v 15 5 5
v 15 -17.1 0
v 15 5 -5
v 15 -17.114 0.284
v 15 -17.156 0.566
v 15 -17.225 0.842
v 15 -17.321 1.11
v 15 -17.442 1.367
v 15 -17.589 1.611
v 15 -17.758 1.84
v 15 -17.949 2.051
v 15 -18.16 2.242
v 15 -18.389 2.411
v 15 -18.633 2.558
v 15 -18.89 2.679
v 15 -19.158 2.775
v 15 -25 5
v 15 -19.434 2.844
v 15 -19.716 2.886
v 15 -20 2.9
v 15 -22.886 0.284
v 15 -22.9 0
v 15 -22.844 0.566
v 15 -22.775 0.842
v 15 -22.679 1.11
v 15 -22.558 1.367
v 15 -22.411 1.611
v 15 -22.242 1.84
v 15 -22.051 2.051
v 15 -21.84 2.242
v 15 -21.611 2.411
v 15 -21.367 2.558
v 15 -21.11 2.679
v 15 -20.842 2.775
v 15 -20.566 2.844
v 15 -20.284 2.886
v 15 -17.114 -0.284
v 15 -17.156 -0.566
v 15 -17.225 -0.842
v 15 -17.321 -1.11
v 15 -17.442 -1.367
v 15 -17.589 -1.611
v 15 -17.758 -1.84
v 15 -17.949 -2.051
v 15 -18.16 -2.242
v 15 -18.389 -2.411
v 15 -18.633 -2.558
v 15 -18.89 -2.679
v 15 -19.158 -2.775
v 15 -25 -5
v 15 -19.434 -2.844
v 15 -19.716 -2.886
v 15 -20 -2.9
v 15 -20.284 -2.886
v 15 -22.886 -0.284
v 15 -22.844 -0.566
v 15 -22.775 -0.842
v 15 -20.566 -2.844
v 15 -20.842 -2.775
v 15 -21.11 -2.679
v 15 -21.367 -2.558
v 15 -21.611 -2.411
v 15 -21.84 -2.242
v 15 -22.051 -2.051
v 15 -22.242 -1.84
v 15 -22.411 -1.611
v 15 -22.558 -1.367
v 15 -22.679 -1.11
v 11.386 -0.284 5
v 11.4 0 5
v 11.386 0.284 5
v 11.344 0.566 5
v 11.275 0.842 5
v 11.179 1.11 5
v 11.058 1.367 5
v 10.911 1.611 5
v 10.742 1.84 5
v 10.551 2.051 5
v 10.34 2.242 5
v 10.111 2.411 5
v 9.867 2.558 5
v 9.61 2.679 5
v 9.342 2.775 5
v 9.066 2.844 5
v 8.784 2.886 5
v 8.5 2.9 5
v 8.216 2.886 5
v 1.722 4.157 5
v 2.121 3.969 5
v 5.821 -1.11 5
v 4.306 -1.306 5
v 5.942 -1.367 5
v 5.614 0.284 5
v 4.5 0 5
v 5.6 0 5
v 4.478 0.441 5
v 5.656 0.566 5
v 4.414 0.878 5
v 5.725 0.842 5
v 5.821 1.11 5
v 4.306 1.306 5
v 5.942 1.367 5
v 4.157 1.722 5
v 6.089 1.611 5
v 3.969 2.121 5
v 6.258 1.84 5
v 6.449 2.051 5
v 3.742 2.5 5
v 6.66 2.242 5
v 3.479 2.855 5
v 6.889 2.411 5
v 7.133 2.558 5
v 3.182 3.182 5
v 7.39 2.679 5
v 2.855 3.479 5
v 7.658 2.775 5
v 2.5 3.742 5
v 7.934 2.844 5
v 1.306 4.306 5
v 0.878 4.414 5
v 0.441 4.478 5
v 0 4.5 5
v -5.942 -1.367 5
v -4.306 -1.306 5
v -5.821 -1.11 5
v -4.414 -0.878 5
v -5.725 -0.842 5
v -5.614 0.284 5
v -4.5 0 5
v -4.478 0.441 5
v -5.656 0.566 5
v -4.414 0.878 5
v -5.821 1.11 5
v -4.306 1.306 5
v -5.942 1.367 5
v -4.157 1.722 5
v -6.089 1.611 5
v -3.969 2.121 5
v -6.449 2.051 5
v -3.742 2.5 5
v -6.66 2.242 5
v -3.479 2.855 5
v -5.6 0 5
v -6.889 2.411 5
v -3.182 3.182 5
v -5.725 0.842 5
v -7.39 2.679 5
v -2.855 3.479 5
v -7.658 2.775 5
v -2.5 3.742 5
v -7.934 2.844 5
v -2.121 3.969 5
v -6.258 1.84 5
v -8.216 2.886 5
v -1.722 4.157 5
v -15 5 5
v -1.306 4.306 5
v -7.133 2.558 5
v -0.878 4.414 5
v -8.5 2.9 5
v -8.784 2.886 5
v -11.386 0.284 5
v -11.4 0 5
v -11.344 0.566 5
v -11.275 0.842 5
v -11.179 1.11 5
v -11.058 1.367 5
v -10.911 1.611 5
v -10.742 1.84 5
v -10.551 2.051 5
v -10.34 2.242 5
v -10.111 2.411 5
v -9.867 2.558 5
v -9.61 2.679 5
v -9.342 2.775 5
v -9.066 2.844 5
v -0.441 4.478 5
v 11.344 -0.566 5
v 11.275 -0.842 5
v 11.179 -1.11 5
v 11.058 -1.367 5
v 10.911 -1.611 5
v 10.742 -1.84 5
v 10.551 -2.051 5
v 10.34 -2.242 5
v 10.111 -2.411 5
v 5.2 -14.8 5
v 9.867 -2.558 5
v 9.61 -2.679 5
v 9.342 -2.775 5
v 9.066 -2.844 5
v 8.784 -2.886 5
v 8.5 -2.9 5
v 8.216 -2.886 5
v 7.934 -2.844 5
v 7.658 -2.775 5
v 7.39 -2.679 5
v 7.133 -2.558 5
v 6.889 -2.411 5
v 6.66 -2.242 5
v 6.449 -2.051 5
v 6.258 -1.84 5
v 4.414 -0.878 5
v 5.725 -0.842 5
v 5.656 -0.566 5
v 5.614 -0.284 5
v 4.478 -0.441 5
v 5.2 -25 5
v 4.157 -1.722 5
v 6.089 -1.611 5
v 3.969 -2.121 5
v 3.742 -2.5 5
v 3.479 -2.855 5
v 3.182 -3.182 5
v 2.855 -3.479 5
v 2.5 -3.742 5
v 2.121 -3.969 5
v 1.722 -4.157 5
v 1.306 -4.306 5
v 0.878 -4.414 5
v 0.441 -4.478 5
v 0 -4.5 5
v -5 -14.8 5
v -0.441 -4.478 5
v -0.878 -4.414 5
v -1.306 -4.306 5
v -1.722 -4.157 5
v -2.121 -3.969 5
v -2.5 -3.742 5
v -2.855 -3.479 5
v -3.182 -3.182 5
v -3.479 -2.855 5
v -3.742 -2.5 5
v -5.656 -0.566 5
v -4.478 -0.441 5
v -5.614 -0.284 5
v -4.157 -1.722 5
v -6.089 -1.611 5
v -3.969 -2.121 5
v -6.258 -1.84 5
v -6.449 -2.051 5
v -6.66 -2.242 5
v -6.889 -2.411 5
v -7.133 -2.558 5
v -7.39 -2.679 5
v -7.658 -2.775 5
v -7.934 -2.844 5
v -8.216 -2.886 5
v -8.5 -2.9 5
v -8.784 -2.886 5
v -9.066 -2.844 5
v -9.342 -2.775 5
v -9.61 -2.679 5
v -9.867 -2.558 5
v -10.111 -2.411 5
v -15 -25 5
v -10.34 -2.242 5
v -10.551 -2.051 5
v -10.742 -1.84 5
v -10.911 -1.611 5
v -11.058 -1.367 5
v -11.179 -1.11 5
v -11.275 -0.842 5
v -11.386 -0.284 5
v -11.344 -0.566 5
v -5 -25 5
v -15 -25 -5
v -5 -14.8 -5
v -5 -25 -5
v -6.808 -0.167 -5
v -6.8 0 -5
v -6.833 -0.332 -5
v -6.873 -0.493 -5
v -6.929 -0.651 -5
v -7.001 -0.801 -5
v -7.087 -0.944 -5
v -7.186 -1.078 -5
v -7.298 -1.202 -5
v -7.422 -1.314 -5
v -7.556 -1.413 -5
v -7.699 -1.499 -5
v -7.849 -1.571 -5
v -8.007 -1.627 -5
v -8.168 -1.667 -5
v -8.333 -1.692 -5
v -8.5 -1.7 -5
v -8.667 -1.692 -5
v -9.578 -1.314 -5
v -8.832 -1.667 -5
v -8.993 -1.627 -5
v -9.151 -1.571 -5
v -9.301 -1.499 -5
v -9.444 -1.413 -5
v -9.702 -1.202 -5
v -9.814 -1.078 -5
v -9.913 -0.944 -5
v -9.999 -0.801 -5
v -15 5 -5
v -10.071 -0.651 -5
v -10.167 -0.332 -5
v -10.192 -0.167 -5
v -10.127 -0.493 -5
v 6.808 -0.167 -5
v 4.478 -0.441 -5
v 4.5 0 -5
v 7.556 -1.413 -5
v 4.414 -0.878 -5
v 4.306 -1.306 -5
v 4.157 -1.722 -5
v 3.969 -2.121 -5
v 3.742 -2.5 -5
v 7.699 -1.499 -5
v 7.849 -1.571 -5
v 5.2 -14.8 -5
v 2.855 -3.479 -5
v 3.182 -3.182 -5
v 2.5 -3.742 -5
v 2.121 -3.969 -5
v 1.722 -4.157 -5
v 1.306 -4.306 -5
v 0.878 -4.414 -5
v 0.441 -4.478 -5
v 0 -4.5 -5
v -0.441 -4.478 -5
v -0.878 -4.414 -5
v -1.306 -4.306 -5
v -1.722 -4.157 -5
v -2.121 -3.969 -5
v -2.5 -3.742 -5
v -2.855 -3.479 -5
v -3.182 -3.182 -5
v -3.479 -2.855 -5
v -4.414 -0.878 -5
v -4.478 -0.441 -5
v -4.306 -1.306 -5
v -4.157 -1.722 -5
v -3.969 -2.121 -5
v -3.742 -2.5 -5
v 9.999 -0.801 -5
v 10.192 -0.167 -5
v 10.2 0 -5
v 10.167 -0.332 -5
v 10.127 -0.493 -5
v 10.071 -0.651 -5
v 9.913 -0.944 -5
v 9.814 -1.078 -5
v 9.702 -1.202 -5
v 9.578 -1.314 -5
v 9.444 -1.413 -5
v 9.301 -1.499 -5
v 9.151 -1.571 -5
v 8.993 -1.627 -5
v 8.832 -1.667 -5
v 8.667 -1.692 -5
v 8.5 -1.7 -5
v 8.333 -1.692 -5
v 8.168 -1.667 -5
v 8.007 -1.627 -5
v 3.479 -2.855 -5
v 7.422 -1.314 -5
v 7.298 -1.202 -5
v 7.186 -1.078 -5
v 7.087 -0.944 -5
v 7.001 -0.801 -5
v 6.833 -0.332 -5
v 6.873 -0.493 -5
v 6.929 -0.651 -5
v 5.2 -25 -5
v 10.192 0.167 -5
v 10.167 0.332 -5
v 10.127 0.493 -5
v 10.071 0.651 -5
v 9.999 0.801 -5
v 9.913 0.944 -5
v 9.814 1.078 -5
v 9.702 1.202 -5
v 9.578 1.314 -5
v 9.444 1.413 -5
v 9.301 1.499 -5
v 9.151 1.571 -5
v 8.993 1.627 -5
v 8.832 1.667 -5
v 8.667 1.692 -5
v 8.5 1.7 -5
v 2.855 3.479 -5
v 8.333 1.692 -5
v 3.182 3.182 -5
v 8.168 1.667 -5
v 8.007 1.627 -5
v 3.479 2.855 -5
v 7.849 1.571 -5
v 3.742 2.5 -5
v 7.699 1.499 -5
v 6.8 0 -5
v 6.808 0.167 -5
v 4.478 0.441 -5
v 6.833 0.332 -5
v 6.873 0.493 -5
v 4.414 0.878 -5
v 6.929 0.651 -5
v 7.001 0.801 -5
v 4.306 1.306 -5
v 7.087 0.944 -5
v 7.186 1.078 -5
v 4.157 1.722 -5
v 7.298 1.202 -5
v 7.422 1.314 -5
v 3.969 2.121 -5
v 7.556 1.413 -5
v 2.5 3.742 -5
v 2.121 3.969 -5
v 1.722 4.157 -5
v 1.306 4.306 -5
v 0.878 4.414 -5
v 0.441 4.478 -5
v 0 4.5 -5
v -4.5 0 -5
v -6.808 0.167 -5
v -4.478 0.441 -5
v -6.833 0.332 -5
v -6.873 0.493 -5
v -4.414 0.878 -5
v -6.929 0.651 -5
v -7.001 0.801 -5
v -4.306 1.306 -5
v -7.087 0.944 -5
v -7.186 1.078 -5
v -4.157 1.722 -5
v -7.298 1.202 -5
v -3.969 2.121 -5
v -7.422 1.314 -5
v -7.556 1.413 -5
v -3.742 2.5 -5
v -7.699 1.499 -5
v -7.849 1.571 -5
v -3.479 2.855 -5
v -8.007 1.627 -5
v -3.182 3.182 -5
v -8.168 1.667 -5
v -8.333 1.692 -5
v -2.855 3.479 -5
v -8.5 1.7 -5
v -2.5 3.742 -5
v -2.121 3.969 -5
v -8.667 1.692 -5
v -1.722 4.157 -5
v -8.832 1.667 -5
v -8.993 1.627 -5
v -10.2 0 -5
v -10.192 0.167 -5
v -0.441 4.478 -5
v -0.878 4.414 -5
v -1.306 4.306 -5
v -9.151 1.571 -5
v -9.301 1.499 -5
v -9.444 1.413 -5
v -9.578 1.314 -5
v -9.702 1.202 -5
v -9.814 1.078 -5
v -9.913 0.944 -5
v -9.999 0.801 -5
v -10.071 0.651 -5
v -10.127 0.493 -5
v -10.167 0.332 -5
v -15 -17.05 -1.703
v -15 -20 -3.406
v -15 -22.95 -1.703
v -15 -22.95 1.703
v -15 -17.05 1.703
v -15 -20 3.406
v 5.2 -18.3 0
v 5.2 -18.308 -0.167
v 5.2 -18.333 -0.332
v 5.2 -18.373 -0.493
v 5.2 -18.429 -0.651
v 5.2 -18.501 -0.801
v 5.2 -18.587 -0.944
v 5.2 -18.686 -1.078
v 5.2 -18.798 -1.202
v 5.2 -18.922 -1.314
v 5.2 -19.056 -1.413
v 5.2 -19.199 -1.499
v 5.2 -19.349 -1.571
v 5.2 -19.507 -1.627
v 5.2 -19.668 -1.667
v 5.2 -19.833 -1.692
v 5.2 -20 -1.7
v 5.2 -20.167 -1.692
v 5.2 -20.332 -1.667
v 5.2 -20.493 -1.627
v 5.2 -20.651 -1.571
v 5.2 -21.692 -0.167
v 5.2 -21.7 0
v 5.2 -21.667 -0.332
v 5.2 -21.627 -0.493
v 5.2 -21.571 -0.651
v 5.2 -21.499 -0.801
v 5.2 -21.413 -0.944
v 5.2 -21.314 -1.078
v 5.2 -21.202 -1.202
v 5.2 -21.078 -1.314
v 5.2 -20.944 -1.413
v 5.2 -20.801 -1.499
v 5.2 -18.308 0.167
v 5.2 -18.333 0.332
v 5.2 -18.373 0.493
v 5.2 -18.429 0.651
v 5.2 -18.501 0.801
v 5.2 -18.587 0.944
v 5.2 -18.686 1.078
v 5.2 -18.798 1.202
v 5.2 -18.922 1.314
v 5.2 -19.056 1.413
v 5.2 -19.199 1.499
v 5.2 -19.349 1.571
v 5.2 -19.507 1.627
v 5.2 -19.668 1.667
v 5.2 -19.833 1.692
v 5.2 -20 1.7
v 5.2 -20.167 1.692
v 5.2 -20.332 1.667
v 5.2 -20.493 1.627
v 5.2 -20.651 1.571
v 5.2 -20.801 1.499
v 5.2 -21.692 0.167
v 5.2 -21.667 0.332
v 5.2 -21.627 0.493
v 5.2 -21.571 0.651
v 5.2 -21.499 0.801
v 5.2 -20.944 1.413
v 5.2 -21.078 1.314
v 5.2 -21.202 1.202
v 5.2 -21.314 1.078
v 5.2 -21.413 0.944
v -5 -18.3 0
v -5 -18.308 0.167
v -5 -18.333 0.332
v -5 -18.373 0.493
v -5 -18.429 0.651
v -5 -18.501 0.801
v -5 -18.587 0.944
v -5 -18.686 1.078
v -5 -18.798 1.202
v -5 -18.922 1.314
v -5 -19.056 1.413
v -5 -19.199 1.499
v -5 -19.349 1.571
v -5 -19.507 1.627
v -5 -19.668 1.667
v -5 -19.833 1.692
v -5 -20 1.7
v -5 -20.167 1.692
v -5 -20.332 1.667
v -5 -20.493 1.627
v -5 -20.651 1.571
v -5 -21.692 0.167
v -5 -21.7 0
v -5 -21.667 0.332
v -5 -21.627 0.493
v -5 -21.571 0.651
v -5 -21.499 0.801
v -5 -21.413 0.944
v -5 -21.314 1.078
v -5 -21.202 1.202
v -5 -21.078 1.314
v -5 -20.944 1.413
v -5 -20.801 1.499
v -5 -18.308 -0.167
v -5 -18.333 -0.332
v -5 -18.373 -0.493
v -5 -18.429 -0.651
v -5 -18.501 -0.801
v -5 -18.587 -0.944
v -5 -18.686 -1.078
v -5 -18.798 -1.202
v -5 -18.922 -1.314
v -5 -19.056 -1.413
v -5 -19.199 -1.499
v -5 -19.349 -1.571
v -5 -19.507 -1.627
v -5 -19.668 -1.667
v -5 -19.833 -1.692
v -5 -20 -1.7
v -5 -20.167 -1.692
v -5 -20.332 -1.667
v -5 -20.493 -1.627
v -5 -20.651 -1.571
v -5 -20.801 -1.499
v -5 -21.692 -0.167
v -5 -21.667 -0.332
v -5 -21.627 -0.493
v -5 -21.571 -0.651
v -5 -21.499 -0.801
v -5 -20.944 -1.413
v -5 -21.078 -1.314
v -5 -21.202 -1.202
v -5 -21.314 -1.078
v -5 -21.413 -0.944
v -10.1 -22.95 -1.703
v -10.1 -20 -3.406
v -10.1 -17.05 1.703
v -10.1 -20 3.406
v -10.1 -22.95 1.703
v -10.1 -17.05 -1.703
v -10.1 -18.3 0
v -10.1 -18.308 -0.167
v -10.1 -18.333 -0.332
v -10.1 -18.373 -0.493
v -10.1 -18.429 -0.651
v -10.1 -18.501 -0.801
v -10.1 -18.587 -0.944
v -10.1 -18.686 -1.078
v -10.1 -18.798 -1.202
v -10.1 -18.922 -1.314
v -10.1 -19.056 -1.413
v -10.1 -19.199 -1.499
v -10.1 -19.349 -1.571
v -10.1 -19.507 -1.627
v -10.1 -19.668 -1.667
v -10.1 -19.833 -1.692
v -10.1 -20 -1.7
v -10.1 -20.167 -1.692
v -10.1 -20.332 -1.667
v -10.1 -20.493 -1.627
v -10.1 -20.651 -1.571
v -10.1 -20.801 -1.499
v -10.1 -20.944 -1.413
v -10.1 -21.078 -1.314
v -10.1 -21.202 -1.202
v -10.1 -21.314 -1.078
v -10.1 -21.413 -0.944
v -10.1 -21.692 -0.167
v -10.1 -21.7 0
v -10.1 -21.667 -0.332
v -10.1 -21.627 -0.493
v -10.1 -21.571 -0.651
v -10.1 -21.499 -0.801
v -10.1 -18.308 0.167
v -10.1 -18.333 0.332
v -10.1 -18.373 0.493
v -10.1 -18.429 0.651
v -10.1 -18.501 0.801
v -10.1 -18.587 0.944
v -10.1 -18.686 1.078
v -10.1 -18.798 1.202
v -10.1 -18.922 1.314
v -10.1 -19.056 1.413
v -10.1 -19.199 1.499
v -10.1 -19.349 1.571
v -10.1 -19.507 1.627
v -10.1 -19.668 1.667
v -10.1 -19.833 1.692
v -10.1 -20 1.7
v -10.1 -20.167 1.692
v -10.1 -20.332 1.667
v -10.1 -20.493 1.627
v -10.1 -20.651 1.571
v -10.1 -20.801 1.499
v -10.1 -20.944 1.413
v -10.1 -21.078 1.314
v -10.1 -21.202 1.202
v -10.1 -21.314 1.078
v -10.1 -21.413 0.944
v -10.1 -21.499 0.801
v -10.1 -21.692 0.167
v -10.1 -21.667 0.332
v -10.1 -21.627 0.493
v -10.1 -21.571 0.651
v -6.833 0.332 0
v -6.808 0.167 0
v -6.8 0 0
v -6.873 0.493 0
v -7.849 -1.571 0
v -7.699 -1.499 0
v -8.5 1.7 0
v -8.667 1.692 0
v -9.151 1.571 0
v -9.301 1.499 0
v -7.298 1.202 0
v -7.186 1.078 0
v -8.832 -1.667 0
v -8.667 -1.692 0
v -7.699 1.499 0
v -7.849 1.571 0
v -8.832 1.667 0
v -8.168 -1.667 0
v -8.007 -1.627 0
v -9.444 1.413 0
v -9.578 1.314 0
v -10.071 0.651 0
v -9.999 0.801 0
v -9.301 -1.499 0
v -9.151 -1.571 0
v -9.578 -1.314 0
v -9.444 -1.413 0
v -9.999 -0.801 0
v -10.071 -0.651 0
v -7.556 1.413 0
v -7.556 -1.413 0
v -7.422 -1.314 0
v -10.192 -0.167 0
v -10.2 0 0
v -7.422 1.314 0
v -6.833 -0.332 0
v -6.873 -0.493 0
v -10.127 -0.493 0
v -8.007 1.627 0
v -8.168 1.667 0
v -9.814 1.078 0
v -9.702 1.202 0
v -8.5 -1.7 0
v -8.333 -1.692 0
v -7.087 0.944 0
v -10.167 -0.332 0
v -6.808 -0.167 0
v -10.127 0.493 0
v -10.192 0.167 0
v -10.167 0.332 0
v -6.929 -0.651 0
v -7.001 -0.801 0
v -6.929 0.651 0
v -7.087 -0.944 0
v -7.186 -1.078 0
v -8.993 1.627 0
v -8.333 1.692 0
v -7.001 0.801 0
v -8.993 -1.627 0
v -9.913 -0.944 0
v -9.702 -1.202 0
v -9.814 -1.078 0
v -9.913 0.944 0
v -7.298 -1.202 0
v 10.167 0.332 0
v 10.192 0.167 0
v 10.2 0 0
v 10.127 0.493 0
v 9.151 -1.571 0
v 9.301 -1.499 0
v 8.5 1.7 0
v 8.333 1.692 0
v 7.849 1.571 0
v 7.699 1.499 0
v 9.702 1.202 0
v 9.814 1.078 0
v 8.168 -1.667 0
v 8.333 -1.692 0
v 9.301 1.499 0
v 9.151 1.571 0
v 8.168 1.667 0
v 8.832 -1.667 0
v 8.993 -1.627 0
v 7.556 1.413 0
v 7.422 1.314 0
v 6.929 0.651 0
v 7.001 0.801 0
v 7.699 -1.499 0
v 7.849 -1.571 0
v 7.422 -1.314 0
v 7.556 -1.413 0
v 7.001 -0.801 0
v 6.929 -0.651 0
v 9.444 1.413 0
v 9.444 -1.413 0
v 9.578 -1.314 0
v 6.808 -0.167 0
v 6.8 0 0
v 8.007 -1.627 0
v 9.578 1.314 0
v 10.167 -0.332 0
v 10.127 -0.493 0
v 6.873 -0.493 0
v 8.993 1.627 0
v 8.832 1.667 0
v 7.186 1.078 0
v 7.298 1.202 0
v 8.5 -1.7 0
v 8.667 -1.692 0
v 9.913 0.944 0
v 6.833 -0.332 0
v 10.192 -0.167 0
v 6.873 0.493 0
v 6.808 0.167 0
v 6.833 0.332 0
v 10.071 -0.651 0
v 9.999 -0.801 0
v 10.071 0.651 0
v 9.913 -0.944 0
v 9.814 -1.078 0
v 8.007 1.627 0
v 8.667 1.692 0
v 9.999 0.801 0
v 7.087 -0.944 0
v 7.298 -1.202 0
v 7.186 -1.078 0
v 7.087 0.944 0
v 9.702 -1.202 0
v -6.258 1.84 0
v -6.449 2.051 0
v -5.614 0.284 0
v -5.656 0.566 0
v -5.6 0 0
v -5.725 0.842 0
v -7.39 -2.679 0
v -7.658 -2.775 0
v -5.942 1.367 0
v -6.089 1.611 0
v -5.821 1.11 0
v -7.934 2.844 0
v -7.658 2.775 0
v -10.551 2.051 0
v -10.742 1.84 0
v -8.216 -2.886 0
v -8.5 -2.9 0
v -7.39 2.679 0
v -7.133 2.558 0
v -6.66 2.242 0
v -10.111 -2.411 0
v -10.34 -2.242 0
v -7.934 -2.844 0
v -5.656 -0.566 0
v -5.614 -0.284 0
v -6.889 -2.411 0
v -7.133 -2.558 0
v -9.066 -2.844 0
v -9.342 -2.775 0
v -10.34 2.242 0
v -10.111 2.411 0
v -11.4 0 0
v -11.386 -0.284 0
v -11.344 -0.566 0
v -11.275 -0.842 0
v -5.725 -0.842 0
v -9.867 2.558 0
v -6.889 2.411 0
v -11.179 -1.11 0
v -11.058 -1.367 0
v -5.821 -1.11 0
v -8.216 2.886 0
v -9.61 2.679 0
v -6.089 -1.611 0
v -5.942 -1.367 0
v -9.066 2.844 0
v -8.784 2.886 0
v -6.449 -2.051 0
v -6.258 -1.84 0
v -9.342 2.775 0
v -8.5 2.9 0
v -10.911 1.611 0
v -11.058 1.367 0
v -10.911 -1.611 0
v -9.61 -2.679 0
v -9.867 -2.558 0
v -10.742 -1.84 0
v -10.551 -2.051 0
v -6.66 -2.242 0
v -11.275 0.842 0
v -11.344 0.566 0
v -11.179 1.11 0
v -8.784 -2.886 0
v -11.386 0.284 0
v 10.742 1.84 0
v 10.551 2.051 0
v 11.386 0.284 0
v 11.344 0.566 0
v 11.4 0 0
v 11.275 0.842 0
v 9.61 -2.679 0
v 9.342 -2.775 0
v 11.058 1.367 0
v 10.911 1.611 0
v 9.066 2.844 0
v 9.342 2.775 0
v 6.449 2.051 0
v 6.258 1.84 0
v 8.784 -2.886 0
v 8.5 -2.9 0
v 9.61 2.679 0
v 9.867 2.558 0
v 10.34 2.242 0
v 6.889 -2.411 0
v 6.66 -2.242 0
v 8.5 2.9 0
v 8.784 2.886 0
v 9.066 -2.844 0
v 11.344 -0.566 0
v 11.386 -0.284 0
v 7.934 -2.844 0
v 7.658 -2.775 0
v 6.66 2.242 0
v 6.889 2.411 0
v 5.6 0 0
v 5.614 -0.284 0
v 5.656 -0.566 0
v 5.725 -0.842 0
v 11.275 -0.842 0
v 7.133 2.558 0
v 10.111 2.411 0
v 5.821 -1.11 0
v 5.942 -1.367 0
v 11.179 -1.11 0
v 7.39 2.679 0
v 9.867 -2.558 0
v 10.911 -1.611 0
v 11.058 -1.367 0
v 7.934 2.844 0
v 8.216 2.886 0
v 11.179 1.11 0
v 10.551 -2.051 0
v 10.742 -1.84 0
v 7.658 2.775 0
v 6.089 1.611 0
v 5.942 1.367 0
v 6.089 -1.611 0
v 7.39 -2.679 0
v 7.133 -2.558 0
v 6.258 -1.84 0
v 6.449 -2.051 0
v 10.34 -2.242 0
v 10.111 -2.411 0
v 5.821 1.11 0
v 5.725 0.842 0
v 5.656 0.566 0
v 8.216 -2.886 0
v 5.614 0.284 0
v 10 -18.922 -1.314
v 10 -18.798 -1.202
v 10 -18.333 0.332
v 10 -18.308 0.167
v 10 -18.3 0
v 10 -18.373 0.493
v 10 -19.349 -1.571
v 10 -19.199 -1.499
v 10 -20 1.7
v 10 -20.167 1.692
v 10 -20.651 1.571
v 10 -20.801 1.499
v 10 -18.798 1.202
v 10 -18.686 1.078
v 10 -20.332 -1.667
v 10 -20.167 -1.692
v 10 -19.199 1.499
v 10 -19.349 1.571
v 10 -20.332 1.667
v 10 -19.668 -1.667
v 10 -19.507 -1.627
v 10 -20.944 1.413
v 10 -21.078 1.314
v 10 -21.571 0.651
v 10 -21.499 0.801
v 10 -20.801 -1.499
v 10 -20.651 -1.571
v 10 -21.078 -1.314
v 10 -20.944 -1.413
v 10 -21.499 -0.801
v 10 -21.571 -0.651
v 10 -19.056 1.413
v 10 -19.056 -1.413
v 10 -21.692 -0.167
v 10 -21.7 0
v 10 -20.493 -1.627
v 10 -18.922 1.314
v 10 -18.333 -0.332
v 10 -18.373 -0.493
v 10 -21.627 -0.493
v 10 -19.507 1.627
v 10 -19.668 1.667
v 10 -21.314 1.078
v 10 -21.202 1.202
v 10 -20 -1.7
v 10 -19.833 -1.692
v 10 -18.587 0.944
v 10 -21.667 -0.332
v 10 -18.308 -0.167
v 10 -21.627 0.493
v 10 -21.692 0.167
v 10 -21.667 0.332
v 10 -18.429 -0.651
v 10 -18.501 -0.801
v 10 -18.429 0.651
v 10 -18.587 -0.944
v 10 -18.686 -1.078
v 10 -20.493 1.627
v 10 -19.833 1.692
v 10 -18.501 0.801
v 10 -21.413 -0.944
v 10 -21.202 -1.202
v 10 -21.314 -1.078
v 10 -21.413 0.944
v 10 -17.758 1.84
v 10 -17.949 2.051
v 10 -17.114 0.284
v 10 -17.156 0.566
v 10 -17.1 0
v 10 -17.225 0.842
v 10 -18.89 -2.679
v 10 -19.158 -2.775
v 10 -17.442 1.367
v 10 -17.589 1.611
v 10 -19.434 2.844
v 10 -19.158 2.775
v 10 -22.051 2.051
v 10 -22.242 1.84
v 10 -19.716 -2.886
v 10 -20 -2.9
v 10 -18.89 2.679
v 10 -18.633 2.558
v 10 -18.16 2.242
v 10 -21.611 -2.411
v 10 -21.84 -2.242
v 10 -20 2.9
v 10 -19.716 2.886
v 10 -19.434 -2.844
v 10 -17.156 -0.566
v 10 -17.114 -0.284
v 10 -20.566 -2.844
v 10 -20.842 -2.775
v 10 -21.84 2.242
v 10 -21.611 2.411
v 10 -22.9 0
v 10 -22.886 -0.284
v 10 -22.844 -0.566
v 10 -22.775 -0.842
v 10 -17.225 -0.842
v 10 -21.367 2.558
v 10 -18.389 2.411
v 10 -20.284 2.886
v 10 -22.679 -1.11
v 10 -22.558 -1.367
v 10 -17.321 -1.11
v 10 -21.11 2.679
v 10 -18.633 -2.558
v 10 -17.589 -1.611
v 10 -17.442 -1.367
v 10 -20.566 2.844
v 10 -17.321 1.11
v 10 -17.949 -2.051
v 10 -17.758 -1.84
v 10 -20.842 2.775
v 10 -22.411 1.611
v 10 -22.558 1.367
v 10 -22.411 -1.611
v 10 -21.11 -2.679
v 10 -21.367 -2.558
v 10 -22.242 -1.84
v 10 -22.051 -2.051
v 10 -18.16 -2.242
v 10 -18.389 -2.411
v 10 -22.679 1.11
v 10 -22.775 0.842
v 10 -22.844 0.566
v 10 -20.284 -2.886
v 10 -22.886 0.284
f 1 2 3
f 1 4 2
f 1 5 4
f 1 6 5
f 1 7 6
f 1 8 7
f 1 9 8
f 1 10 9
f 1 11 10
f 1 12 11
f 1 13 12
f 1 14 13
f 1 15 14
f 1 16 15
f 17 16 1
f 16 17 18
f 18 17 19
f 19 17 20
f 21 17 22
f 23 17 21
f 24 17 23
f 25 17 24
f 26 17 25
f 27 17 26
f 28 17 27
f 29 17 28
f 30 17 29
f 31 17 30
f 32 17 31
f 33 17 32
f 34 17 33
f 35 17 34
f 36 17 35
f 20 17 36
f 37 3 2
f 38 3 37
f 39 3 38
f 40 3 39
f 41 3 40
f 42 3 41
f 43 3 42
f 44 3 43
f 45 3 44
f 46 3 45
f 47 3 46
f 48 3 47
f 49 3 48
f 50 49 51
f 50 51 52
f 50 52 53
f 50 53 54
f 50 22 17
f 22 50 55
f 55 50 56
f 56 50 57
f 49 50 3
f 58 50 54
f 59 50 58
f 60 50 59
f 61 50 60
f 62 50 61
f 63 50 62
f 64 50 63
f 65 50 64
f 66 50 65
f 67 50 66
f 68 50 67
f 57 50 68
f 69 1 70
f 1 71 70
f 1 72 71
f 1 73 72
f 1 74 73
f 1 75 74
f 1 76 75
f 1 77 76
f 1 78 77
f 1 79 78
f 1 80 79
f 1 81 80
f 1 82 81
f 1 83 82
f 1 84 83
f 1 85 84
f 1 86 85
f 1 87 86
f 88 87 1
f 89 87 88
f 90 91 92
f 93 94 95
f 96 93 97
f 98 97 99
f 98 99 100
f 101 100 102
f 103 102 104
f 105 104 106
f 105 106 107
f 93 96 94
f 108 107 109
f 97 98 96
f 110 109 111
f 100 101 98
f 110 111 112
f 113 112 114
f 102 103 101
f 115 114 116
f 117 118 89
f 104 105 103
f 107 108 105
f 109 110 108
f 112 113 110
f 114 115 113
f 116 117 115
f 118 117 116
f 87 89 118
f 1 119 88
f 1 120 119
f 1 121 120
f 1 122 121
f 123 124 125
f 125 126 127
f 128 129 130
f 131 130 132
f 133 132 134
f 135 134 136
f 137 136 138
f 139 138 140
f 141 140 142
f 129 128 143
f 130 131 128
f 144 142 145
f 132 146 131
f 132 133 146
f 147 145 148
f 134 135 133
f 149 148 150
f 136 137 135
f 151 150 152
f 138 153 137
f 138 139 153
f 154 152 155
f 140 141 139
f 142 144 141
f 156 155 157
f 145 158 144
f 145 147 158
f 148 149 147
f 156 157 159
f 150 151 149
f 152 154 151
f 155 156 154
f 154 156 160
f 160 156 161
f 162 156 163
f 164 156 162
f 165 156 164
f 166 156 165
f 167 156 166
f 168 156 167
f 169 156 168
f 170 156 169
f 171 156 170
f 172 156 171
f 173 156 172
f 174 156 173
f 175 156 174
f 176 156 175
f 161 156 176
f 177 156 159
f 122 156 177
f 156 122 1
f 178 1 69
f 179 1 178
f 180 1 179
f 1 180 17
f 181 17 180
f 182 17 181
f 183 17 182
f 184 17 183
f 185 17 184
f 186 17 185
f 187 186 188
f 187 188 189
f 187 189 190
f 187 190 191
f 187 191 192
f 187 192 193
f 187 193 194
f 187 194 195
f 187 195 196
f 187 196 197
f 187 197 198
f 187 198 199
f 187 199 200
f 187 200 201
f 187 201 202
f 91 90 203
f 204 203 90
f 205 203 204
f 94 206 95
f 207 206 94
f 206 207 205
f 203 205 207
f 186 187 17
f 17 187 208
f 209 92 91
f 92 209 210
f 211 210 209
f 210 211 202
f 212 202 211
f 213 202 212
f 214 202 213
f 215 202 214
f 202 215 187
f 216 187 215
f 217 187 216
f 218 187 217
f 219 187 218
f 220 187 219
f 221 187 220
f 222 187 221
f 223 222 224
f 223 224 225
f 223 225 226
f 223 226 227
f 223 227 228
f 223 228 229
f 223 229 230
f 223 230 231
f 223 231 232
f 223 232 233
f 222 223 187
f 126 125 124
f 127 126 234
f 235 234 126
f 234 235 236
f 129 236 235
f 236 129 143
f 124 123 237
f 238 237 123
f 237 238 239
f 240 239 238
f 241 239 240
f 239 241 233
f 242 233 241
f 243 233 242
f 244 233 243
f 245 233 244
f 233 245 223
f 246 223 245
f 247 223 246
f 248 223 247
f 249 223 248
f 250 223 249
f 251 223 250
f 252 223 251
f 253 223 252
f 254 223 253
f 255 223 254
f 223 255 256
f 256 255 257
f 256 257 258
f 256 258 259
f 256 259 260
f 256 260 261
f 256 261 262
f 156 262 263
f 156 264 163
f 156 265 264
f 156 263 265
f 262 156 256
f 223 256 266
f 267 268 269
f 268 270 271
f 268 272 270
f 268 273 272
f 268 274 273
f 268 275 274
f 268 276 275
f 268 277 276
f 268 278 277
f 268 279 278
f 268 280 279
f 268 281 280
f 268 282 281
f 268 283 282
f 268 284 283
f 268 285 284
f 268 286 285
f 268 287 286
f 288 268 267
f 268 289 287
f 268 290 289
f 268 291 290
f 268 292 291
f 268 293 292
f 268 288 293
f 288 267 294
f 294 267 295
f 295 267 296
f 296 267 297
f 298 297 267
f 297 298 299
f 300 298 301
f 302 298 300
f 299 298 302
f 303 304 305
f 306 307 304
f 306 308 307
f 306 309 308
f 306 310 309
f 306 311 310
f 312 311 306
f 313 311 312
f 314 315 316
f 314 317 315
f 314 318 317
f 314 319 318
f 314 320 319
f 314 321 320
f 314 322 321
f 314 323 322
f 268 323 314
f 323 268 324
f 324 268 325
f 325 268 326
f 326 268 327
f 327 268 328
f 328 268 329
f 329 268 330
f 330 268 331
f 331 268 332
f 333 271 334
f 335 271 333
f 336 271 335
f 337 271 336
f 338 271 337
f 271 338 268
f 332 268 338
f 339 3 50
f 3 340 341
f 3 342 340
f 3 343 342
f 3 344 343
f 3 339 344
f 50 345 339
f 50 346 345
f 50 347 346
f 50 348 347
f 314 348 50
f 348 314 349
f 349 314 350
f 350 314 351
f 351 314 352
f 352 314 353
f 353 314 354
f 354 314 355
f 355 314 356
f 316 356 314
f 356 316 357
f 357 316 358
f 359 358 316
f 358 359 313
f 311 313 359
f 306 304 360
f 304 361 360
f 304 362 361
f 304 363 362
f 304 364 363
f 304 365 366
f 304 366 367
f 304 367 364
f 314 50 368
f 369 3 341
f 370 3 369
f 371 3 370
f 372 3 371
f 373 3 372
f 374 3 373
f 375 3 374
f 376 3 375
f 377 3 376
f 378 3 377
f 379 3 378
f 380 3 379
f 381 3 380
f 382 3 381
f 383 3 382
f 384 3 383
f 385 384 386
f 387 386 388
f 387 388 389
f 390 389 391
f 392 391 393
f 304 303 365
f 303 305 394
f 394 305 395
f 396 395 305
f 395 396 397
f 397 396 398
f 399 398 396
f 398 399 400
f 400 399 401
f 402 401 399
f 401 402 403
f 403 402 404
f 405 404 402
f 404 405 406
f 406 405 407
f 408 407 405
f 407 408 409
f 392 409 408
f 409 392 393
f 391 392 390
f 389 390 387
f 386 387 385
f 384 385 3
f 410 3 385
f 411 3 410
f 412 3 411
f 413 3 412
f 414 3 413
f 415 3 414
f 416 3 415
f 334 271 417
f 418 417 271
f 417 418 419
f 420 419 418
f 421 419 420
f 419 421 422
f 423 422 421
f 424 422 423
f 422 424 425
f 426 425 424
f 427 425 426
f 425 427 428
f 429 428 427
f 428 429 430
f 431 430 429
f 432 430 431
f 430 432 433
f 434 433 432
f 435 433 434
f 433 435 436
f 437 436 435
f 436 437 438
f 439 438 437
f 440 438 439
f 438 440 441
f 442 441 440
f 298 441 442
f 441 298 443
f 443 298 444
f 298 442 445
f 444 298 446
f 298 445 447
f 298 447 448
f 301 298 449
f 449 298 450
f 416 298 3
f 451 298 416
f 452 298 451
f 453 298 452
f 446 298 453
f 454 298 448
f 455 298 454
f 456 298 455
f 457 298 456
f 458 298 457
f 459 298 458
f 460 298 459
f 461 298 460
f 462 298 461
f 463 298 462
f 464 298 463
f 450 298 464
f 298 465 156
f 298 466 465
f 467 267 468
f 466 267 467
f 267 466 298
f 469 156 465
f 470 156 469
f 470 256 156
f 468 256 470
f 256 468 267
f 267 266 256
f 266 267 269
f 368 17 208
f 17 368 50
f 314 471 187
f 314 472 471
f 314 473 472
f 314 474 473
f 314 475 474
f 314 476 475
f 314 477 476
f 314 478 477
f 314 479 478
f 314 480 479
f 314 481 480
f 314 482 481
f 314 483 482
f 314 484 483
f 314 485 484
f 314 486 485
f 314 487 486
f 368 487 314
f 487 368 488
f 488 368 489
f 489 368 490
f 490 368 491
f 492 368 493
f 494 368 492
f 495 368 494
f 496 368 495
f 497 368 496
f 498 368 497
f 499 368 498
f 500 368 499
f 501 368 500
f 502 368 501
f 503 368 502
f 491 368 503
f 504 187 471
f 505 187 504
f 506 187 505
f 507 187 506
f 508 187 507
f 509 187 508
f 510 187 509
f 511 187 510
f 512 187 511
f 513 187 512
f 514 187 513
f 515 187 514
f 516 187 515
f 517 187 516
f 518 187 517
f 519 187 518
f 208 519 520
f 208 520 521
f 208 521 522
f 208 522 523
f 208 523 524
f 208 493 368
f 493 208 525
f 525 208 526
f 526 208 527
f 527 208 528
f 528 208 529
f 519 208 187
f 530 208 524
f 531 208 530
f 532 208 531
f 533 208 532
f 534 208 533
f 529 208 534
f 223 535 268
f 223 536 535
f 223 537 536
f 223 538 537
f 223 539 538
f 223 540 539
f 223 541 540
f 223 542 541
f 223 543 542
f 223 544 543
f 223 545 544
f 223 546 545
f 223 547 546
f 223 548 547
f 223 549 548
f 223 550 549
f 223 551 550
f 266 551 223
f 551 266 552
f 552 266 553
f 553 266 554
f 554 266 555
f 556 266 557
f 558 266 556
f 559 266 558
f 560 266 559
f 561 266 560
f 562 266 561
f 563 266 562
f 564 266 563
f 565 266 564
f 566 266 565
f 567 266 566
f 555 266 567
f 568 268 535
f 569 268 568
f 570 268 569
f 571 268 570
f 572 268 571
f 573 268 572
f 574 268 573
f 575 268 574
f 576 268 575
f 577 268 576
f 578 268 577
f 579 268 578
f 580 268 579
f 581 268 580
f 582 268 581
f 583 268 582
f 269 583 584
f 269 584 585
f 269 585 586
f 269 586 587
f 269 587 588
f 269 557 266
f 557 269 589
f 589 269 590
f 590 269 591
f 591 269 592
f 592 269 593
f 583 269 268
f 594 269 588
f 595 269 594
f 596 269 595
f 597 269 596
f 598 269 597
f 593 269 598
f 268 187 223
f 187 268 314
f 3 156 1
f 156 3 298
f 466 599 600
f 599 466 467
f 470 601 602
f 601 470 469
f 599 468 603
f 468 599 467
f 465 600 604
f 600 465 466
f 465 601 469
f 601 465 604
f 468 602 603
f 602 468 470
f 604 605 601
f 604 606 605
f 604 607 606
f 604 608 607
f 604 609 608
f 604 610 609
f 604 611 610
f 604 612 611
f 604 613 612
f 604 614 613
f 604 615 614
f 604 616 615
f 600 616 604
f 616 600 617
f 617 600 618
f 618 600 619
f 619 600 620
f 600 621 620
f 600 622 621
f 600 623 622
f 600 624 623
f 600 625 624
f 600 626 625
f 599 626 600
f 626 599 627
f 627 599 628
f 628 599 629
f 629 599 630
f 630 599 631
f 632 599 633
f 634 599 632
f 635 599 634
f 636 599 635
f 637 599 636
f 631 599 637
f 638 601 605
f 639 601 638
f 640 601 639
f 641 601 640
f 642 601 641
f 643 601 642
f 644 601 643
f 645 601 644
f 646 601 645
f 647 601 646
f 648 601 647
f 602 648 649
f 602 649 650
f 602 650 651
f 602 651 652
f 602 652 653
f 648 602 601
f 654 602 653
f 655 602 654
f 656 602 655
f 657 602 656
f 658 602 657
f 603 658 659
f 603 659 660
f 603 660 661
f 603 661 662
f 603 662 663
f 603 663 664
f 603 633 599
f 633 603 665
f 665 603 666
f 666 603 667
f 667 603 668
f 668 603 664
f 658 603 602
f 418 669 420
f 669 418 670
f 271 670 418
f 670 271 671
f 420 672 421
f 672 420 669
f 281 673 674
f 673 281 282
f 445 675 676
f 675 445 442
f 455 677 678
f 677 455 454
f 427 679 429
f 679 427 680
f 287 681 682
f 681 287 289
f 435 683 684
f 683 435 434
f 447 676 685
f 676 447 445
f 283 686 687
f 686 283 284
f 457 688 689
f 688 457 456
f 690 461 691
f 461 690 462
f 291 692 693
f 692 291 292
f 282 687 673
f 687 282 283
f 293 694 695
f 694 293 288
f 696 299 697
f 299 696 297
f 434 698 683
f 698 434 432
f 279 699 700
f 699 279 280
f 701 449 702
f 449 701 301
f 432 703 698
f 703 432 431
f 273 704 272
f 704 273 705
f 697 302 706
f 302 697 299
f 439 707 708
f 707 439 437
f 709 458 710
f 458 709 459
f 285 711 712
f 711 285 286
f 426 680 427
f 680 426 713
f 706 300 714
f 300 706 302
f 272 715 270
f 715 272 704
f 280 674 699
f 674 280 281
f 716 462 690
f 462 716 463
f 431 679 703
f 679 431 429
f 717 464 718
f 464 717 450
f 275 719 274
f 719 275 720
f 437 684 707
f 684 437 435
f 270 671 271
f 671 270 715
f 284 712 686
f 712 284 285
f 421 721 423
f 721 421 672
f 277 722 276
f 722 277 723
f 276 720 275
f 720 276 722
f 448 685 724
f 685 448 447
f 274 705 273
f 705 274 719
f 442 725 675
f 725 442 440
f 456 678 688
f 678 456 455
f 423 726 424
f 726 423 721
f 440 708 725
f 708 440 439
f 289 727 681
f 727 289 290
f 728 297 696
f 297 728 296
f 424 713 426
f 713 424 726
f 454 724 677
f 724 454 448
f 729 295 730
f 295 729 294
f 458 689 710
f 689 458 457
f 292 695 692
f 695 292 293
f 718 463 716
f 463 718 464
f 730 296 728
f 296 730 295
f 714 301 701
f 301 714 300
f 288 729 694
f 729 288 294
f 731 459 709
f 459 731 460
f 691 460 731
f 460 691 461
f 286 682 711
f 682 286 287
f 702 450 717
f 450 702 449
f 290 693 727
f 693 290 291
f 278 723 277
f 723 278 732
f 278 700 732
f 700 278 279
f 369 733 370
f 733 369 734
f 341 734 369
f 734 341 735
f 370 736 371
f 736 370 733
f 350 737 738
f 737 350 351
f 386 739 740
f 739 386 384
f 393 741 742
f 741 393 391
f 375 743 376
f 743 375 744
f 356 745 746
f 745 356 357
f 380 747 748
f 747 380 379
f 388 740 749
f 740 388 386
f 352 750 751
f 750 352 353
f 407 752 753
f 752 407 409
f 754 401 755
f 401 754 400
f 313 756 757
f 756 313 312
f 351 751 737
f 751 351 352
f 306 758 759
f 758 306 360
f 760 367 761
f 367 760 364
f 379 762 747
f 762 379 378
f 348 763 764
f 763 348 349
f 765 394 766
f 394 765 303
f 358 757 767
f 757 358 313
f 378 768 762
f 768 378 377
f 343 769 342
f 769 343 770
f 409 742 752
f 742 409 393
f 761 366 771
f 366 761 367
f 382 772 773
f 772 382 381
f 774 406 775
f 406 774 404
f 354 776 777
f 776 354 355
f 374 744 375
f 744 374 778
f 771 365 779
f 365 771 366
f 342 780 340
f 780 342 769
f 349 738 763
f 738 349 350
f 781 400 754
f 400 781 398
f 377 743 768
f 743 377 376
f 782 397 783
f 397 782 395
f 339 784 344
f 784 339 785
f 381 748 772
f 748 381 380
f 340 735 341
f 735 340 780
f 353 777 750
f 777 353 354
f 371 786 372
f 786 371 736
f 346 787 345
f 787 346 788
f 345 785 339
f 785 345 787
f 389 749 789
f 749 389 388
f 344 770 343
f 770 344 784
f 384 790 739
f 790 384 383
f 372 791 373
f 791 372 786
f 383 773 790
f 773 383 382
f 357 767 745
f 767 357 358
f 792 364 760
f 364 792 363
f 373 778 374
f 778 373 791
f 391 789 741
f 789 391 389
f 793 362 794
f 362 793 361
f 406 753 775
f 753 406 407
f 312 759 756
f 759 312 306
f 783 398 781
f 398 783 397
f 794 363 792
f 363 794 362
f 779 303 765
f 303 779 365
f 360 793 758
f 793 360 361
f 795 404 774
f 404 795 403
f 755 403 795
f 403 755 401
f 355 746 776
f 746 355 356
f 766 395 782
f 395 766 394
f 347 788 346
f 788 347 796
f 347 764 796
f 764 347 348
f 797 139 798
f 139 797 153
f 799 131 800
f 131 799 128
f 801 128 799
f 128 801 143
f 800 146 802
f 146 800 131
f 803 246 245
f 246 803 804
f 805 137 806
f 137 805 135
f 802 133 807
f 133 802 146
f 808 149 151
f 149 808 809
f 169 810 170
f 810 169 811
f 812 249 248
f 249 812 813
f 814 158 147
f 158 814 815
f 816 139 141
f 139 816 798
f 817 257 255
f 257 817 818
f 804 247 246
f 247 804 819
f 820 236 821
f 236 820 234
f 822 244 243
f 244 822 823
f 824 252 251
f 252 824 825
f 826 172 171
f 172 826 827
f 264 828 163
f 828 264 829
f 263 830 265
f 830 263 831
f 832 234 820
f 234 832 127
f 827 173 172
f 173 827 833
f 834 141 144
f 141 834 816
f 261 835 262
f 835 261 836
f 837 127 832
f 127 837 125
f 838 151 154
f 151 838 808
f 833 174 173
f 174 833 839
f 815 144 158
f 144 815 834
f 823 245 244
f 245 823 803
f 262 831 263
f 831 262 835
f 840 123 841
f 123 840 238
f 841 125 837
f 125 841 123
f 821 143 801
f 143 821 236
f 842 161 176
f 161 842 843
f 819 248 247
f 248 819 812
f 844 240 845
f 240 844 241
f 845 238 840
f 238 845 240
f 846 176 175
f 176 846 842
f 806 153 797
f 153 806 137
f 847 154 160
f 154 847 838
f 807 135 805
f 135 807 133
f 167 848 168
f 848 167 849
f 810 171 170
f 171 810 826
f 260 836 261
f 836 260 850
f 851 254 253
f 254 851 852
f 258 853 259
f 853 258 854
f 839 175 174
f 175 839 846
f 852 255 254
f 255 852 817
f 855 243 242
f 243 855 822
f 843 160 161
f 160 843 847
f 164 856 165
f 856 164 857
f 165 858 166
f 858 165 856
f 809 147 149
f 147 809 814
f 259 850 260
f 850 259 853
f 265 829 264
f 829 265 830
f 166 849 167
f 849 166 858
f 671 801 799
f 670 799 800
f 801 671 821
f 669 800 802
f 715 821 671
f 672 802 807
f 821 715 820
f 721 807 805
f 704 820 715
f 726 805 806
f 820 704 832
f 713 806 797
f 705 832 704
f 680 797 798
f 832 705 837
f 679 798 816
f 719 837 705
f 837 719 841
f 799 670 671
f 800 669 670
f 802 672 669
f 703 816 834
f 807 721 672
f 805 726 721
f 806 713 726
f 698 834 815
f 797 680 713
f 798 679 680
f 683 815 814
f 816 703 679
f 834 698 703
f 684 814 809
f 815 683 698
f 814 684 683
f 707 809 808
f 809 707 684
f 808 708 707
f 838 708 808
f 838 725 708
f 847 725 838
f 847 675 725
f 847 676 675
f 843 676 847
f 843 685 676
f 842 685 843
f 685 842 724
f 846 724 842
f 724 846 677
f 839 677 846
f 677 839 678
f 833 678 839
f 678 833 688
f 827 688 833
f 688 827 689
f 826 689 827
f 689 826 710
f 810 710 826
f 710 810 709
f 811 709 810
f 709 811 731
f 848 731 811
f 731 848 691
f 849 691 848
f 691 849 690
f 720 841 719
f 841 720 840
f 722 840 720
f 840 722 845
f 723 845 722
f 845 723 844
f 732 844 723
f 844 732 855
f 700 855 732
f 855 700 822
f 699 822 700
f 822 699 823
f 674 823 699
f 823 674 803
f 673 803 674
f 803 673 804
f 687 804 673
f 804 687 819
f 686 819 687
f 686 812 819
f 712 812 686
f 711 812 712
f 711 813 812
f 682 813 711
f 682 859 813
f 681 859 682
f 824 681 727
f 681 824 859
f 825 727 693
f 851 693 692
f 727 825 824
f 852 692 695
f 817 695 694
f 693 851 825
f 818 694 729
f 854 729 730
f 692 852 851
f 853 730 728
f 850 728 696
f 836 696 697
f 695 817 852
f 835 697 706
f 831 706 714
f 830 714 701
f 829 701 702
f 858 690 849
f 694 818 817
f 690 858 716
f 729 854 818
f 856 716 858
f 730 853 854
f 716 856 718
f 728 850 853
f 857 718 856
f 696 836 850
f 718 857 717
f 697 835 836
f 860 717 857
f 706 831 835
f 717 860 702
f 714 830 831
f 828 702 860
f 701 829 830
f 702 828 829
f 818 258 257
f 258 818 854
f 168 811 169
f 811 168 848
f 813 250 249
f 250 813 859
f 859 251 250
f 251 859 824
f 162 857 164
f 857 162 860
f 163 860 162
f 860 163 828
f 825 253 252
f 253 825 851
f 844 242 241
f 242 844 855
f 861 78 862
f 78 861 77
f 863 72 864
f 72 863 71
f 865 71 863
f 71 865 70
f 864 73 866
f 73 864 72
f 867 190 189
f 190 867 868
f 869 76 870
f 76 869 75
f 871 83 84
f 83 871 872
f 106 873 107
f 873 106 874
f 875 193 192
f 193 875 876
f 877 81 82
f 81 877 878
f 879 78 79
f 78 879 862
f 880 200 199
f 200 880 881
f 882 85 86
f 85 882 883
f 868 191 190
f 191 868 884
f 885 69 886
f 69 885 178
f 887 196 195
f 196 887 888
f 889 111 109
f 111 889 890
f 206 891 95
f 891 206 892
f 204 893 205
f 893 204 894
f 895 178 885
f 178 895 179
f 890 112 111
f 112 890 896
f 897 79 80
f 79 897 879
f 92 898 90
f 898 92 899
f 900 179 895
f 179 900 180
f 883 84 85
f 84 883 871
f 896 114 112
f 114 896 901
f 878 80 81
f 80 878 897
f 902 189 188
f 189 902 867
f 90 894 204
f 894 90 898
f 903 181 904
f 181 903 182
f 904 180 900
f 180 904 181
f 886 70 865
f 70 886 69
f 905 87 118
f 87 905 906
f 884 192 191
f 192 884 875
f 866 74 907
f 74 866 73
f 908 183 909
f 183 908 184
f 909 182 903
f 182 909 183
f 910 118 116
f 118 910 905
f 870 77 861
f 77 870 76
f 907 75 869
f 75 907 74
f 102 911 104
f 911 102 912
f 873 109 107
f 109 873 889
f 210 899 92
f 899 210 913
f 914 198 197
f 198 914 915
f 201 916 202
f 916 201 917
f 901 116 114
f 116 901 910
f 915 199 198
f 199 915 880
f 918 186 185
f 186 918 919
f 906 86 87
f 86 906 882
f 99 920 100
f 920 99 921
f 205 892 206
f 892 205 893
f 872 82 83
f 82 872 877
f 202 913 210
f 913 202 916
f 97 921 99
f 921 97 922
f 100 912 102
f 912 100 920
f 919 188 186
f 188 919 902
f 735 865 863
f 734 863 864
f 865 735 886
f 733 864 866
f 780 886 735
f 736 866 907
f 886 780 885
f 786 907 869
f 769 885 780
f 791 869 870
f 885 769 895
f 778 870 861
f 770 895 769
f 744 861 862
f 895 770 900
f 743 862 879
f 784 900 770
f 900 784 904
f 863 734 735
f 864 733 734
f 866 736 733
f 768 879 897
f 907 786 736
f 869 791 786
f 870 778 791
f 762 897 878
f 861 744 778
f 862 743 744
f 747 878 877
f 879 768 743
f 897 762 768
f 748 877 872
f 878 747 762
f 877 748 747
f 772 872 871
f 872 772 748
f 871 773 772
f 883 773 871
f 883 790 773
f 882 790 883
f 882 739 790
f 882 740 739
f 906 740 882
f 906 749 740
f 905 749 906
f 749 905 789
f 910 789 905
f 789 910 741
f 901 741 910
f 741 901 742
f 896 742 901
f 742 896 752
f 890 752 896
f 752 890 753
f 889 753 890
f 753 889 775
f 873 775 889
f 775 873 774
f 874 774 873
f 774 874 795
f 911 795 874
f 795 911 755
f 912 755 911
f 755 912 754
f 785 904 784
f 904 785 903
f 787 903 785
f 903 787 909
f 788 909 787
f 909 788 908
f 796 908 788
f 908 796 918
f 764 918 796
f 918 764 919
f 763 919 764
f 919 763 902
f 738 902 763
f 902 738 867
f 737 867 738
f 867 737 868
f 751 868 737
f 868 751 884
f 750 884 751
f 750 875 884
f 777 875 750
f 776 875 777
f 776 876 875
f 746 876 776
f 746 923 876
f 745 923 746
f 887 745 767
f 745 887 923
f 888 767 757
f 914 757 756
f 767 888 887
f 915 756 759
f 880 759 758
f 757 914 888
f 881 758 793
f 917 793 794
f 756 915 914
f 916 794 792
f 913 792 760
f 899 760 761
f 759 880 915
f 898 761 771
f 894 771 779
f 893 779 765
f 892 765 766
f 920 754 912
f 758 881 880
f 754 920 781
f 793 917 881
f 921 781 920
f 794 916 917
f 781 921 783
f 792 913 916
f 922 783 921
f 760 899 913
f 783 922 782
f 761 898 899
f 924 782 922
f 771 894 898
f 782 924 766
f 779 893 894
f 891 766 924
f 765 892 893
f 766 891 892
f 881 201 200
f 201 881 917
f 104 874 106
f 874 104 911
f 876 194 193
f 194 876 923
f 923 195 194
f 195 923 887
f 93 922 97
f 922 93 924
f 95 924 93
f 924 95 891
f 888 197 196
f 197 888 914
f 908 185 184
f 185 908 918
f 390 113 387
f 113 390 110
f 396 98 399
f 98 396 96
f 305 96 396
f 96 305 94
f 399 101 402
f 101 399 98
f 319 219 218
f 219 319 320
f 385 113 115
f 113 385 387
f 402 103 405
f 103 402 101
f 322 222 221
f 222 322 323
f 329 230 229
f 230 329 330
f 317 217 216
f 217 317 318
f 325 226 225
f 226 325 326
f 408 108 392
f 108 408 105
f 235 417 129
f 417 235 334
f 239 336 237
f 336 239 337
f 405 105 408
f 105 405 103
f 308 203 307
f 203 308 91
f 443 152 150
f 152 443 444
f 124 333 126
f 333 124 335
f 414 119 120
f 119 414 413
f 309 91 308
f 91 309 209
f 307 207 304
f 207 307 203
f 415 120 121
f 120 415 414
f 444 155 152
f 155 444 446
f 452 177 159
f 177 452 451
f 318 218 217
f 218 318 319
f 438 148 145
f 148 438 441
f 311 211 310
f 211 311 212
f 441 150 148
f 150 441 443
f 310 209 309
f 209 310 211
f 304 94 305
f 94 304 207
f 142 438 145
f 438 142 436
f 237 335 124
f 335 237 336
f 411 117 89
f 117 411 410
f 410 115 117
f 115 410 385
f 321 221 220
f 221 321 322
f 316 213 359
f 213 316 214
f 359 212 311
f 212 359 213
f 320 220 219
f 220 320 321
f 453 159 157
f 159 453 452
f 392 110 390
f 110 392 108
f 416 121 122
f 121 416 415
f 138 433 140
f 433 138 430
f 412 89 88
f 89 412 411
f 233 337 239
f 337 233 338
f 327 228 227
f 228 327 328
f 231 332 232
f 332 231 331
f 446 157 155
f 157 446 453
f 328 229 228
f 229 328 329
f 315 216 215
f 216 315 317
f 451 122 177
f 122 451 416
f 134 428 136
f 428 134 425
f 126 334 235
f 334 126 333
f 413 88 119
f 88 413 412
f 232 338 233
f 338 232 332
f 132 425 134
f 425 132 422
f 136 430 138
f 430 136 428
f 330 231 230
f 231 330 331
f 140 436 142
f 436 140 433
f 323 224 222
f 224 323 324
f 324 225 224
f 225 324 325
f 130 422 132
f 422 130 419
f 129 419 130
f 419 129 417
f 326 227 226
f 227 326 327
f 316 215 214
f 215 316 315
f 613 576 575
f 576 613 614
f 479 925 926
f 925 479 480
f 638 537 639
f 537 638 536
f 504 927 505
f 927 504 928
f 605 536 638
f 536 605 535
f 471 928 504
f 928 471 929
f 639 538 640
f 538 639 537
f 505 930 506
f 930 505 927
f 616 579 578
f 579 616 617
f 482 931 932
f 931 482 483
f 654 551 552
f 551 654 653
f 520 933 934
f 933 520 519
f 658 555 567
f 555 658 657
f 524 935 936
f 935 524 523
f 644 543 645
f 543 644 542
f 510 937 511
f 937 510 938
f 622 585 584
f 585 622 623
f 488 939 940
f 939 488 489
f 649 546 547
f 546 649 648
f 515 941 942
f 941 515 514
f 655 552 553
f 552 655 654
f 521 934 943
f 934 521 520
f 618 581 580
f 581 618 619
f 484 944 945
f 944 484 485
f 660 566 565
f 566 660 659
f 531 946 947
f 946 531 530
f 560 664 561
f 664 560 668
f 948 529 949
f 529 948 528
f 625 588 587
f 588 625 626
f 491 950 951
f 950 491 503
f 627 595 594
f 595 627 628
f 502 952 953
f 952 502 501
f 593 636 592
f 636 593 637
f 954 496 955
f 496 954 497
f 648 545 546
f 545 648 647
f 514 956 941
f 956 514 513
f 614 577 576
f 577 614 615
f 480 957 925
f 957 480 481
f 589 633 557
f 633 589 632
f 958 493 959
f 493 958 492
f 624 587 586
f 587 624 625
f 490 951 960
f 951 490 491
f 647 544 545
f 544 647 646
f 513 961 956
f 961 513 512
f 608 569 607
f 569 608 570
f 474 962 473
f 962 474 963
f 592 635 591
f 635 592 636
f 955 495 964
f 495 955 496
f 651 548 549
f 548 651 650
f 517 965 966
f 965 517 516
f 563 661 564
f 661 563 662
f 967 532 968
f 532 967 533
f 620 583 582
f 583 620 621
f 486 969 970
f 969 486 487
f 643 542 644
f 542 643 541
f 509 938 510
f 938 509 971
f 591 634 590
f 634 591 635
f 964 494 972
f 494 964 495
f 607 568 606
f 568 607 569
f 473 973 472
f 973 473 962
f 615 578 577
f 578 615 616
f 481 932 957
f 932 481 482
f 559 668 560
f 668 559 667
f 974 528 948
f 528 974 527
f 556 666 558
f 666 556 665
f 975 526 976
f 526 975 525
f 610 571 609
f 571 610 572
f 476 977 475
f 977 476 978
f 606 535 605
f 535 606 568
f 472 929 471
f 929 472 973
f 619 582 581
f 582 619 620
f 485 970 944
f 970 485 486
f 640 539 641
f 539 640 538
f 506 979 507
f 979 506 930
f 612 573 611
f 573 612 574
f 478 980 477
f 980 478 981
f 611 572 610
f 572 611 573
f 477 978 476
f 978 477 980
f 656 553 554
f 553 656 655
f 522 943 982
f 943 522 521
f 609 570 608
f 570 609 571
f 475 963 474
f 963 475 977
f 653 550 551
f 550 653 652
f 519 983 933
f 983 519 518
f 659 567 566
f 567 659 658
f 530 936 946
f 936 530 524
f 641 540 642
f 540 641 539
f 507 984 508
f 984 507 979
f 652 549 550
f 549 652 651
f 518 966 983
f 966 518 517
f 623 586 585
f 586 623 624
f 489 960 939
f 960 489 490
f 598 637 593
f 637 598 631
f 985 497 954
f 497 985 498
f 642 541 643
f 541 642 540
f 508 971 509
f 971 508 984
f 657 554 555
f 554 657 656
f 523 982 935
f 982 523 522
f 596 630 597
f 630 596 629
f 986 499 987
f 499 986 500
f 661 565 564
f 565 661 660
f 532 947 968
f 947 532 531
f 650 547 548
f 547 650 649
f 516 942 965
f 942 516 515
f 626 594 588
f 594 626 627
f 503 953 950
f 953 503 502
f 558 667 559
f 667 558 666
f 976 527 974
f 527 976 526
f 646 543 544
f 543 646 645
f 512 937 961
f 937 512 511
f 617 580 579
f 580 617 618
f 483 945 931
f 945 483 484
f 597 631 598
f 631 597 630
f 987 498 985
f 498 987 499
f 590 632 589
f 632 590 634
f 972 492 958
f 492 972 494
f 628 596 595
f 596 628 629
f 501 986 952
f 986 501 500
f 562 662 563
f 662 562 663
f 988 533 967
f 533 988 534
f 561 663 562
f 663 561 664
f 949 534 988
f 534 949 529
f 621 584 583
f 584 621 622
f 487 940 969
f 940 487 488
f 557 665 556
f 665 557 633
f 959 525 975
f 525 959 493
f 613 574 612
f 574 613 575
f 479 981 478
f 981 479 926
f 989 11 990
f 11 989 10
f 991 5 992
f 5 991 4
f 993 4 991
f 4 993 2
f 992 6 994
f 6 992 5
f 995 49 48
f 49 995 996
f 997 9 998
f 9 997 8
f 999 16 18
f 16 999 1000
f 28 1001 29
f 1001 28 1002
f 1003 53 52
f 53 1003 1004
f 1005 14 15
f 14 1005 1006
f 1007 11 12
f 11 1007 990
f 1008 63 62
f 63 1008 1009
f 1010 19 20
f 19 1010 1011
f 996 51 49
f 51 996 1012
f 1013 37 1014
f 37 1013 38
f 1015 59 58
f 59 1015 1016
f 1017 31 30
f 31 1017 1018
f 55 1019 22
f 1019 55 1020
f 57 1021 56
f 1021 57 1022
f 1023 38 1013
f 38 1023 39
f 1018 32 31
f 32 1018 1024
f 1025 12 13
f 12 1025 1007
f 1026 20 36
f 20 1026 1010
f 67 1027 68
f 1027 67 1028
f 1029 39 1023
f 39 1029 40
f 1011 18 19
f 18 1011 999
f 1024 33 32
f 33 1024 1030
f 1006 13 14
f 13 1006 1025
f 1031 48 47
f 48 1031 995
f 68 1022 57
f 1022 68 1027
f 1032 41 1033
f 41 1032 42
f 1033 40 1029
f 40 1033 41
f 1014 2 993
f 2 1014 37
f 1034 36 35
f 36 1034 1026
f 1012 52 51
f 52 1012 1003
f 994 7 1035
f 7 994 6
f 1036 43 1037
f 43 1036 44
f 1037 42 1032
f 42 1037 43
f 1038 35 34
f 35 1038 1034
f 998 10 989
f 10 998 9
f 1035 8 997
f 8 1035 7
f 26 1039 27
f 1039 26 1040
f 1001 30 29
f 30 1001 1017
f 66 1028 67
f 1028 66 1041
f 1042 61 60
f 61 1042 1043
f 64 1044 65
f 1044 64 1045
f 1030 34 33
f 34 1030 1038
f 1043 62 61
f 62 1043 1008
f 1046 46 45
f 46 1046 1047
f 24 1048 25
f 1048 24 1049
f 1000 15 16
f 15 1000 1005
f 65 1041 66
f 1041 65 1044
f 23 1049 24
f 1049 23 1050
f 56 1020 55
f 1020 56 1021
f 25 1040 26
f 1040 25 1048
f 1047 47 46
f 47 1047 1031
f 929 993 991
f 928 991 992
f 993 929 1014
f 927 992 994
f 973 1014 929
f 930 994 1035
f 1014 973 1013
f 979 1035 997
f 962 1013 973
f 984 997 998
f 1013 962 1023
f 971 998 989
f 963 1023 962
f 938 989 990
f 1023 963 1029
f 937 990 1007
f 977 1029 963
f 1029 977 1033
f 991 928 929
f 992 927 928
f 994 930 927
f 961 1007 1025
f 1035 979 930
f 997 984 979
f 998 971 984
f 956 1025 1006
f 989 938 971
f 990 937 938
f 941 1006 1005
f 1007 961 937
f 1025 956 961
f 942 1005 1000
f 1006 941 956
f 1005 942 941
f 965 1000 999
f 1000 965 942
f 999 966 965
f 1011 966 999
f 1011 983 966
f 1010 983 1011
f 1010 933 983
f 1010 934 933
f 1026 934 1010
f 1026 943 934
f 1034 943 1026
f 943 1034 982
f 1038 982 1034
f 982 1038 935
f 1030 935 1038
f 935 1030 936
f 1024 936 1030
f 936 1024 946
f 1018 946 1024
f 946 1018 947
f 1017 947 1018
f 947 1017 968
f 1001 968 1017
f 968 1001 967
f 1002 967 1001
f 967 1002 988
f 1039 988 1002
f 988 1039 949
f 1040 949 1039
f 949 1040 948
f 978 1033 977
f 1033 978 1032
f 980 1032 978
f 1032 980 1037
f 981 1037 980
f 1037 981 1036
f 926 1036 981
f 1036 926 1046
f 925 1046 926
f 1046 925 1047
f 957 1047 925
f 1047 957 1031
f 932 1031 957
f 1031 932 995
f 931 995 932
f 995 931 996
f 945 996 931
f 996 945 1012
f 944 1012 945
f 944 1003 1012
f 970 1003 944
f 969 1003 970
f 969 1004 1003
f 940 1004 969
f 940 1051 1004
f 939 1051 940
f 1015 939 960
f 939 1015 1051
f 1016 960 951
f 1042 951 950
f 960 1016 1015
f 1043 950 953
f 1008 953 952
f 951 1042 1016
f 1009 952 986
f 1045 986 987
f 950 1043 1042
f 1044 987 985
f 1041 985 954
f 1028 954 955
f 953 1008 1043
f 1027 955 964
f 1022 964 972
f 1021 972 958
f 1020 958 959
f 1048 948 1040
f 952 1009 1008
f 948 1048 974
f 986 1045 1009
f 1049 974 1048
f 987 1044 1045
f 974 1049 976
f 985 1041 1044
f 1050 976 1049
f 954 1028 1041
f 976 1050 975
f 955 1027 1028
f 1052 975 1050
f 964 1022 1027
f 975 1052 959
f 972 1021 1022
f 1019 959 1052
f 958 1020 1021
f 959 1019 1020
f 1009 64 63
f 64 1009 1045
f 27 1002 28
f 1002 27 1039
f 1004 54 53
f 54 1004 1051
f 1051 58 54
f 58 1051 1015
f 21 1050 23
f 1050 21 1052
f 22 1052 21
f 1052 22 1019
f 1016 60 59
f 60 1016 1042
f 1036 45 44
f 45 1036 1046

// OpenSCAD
difference() {
sidex=30;
sidey=50;
height=10;
cylinder_small=3.4;
cylinder_big=2*(5.5+0.4) / sqrt(3);
screw_head_height=1 ;
edges=6;
screw_head_m3 = 5.8;
    //Base Foot
cube([sidex,sidey,height], center=true);    
   //Difference Small Cube
translate([-5,-30,-5.1])
    cube([10.2,15.2,10.2]);    

  //Difference Long Cube
translate([-16,5,-5.1])
    cube([31.2,20.2,10.2]);
  
//Strange Hole 1
translate([-20.1,-20,0])
    rotate([0,90,0])
   cylinder(d=cylinder_big, h=20,$fn=edges, center=true);   
  
  
  //Motor Hole 1
translate([-8.5,0,0])
   cylinder(d=cylinder_small, h=20,$fn=64,center=true);
  //Motor Hole 2
translate([8.5,0,0])
   cylinder(d=cylinder_small, h=20,$fn=64,center=true);
  //Motor Big Hole 1
translate([-8.5,0,0])
   cylinder(d=screw_head_m3, h=20,$fn=64);
  //Motor Big Hole 1  
translate([8.5,0,0])
   cylinder(d=screw_head_m3, h=20,$fn=64); 
  
  
  
  
  //Motor Center Hole
translate([0,0,-10])
    cylinder(d=9.0, h=20, $fn=64);
    
    

  
  
  //Side holes Middle

  translate([10,-20,0])
  rotate([90,0,90])
   cylinder(d=cylinder_small, h=70,$fn=64,center=true);

  
   
       //Big Holes

translate([10,-20,0])
  rotate([90,0,90])
   cylinder(d=screw_head_m3, h=20,$fn=64);

  
 
 
}
